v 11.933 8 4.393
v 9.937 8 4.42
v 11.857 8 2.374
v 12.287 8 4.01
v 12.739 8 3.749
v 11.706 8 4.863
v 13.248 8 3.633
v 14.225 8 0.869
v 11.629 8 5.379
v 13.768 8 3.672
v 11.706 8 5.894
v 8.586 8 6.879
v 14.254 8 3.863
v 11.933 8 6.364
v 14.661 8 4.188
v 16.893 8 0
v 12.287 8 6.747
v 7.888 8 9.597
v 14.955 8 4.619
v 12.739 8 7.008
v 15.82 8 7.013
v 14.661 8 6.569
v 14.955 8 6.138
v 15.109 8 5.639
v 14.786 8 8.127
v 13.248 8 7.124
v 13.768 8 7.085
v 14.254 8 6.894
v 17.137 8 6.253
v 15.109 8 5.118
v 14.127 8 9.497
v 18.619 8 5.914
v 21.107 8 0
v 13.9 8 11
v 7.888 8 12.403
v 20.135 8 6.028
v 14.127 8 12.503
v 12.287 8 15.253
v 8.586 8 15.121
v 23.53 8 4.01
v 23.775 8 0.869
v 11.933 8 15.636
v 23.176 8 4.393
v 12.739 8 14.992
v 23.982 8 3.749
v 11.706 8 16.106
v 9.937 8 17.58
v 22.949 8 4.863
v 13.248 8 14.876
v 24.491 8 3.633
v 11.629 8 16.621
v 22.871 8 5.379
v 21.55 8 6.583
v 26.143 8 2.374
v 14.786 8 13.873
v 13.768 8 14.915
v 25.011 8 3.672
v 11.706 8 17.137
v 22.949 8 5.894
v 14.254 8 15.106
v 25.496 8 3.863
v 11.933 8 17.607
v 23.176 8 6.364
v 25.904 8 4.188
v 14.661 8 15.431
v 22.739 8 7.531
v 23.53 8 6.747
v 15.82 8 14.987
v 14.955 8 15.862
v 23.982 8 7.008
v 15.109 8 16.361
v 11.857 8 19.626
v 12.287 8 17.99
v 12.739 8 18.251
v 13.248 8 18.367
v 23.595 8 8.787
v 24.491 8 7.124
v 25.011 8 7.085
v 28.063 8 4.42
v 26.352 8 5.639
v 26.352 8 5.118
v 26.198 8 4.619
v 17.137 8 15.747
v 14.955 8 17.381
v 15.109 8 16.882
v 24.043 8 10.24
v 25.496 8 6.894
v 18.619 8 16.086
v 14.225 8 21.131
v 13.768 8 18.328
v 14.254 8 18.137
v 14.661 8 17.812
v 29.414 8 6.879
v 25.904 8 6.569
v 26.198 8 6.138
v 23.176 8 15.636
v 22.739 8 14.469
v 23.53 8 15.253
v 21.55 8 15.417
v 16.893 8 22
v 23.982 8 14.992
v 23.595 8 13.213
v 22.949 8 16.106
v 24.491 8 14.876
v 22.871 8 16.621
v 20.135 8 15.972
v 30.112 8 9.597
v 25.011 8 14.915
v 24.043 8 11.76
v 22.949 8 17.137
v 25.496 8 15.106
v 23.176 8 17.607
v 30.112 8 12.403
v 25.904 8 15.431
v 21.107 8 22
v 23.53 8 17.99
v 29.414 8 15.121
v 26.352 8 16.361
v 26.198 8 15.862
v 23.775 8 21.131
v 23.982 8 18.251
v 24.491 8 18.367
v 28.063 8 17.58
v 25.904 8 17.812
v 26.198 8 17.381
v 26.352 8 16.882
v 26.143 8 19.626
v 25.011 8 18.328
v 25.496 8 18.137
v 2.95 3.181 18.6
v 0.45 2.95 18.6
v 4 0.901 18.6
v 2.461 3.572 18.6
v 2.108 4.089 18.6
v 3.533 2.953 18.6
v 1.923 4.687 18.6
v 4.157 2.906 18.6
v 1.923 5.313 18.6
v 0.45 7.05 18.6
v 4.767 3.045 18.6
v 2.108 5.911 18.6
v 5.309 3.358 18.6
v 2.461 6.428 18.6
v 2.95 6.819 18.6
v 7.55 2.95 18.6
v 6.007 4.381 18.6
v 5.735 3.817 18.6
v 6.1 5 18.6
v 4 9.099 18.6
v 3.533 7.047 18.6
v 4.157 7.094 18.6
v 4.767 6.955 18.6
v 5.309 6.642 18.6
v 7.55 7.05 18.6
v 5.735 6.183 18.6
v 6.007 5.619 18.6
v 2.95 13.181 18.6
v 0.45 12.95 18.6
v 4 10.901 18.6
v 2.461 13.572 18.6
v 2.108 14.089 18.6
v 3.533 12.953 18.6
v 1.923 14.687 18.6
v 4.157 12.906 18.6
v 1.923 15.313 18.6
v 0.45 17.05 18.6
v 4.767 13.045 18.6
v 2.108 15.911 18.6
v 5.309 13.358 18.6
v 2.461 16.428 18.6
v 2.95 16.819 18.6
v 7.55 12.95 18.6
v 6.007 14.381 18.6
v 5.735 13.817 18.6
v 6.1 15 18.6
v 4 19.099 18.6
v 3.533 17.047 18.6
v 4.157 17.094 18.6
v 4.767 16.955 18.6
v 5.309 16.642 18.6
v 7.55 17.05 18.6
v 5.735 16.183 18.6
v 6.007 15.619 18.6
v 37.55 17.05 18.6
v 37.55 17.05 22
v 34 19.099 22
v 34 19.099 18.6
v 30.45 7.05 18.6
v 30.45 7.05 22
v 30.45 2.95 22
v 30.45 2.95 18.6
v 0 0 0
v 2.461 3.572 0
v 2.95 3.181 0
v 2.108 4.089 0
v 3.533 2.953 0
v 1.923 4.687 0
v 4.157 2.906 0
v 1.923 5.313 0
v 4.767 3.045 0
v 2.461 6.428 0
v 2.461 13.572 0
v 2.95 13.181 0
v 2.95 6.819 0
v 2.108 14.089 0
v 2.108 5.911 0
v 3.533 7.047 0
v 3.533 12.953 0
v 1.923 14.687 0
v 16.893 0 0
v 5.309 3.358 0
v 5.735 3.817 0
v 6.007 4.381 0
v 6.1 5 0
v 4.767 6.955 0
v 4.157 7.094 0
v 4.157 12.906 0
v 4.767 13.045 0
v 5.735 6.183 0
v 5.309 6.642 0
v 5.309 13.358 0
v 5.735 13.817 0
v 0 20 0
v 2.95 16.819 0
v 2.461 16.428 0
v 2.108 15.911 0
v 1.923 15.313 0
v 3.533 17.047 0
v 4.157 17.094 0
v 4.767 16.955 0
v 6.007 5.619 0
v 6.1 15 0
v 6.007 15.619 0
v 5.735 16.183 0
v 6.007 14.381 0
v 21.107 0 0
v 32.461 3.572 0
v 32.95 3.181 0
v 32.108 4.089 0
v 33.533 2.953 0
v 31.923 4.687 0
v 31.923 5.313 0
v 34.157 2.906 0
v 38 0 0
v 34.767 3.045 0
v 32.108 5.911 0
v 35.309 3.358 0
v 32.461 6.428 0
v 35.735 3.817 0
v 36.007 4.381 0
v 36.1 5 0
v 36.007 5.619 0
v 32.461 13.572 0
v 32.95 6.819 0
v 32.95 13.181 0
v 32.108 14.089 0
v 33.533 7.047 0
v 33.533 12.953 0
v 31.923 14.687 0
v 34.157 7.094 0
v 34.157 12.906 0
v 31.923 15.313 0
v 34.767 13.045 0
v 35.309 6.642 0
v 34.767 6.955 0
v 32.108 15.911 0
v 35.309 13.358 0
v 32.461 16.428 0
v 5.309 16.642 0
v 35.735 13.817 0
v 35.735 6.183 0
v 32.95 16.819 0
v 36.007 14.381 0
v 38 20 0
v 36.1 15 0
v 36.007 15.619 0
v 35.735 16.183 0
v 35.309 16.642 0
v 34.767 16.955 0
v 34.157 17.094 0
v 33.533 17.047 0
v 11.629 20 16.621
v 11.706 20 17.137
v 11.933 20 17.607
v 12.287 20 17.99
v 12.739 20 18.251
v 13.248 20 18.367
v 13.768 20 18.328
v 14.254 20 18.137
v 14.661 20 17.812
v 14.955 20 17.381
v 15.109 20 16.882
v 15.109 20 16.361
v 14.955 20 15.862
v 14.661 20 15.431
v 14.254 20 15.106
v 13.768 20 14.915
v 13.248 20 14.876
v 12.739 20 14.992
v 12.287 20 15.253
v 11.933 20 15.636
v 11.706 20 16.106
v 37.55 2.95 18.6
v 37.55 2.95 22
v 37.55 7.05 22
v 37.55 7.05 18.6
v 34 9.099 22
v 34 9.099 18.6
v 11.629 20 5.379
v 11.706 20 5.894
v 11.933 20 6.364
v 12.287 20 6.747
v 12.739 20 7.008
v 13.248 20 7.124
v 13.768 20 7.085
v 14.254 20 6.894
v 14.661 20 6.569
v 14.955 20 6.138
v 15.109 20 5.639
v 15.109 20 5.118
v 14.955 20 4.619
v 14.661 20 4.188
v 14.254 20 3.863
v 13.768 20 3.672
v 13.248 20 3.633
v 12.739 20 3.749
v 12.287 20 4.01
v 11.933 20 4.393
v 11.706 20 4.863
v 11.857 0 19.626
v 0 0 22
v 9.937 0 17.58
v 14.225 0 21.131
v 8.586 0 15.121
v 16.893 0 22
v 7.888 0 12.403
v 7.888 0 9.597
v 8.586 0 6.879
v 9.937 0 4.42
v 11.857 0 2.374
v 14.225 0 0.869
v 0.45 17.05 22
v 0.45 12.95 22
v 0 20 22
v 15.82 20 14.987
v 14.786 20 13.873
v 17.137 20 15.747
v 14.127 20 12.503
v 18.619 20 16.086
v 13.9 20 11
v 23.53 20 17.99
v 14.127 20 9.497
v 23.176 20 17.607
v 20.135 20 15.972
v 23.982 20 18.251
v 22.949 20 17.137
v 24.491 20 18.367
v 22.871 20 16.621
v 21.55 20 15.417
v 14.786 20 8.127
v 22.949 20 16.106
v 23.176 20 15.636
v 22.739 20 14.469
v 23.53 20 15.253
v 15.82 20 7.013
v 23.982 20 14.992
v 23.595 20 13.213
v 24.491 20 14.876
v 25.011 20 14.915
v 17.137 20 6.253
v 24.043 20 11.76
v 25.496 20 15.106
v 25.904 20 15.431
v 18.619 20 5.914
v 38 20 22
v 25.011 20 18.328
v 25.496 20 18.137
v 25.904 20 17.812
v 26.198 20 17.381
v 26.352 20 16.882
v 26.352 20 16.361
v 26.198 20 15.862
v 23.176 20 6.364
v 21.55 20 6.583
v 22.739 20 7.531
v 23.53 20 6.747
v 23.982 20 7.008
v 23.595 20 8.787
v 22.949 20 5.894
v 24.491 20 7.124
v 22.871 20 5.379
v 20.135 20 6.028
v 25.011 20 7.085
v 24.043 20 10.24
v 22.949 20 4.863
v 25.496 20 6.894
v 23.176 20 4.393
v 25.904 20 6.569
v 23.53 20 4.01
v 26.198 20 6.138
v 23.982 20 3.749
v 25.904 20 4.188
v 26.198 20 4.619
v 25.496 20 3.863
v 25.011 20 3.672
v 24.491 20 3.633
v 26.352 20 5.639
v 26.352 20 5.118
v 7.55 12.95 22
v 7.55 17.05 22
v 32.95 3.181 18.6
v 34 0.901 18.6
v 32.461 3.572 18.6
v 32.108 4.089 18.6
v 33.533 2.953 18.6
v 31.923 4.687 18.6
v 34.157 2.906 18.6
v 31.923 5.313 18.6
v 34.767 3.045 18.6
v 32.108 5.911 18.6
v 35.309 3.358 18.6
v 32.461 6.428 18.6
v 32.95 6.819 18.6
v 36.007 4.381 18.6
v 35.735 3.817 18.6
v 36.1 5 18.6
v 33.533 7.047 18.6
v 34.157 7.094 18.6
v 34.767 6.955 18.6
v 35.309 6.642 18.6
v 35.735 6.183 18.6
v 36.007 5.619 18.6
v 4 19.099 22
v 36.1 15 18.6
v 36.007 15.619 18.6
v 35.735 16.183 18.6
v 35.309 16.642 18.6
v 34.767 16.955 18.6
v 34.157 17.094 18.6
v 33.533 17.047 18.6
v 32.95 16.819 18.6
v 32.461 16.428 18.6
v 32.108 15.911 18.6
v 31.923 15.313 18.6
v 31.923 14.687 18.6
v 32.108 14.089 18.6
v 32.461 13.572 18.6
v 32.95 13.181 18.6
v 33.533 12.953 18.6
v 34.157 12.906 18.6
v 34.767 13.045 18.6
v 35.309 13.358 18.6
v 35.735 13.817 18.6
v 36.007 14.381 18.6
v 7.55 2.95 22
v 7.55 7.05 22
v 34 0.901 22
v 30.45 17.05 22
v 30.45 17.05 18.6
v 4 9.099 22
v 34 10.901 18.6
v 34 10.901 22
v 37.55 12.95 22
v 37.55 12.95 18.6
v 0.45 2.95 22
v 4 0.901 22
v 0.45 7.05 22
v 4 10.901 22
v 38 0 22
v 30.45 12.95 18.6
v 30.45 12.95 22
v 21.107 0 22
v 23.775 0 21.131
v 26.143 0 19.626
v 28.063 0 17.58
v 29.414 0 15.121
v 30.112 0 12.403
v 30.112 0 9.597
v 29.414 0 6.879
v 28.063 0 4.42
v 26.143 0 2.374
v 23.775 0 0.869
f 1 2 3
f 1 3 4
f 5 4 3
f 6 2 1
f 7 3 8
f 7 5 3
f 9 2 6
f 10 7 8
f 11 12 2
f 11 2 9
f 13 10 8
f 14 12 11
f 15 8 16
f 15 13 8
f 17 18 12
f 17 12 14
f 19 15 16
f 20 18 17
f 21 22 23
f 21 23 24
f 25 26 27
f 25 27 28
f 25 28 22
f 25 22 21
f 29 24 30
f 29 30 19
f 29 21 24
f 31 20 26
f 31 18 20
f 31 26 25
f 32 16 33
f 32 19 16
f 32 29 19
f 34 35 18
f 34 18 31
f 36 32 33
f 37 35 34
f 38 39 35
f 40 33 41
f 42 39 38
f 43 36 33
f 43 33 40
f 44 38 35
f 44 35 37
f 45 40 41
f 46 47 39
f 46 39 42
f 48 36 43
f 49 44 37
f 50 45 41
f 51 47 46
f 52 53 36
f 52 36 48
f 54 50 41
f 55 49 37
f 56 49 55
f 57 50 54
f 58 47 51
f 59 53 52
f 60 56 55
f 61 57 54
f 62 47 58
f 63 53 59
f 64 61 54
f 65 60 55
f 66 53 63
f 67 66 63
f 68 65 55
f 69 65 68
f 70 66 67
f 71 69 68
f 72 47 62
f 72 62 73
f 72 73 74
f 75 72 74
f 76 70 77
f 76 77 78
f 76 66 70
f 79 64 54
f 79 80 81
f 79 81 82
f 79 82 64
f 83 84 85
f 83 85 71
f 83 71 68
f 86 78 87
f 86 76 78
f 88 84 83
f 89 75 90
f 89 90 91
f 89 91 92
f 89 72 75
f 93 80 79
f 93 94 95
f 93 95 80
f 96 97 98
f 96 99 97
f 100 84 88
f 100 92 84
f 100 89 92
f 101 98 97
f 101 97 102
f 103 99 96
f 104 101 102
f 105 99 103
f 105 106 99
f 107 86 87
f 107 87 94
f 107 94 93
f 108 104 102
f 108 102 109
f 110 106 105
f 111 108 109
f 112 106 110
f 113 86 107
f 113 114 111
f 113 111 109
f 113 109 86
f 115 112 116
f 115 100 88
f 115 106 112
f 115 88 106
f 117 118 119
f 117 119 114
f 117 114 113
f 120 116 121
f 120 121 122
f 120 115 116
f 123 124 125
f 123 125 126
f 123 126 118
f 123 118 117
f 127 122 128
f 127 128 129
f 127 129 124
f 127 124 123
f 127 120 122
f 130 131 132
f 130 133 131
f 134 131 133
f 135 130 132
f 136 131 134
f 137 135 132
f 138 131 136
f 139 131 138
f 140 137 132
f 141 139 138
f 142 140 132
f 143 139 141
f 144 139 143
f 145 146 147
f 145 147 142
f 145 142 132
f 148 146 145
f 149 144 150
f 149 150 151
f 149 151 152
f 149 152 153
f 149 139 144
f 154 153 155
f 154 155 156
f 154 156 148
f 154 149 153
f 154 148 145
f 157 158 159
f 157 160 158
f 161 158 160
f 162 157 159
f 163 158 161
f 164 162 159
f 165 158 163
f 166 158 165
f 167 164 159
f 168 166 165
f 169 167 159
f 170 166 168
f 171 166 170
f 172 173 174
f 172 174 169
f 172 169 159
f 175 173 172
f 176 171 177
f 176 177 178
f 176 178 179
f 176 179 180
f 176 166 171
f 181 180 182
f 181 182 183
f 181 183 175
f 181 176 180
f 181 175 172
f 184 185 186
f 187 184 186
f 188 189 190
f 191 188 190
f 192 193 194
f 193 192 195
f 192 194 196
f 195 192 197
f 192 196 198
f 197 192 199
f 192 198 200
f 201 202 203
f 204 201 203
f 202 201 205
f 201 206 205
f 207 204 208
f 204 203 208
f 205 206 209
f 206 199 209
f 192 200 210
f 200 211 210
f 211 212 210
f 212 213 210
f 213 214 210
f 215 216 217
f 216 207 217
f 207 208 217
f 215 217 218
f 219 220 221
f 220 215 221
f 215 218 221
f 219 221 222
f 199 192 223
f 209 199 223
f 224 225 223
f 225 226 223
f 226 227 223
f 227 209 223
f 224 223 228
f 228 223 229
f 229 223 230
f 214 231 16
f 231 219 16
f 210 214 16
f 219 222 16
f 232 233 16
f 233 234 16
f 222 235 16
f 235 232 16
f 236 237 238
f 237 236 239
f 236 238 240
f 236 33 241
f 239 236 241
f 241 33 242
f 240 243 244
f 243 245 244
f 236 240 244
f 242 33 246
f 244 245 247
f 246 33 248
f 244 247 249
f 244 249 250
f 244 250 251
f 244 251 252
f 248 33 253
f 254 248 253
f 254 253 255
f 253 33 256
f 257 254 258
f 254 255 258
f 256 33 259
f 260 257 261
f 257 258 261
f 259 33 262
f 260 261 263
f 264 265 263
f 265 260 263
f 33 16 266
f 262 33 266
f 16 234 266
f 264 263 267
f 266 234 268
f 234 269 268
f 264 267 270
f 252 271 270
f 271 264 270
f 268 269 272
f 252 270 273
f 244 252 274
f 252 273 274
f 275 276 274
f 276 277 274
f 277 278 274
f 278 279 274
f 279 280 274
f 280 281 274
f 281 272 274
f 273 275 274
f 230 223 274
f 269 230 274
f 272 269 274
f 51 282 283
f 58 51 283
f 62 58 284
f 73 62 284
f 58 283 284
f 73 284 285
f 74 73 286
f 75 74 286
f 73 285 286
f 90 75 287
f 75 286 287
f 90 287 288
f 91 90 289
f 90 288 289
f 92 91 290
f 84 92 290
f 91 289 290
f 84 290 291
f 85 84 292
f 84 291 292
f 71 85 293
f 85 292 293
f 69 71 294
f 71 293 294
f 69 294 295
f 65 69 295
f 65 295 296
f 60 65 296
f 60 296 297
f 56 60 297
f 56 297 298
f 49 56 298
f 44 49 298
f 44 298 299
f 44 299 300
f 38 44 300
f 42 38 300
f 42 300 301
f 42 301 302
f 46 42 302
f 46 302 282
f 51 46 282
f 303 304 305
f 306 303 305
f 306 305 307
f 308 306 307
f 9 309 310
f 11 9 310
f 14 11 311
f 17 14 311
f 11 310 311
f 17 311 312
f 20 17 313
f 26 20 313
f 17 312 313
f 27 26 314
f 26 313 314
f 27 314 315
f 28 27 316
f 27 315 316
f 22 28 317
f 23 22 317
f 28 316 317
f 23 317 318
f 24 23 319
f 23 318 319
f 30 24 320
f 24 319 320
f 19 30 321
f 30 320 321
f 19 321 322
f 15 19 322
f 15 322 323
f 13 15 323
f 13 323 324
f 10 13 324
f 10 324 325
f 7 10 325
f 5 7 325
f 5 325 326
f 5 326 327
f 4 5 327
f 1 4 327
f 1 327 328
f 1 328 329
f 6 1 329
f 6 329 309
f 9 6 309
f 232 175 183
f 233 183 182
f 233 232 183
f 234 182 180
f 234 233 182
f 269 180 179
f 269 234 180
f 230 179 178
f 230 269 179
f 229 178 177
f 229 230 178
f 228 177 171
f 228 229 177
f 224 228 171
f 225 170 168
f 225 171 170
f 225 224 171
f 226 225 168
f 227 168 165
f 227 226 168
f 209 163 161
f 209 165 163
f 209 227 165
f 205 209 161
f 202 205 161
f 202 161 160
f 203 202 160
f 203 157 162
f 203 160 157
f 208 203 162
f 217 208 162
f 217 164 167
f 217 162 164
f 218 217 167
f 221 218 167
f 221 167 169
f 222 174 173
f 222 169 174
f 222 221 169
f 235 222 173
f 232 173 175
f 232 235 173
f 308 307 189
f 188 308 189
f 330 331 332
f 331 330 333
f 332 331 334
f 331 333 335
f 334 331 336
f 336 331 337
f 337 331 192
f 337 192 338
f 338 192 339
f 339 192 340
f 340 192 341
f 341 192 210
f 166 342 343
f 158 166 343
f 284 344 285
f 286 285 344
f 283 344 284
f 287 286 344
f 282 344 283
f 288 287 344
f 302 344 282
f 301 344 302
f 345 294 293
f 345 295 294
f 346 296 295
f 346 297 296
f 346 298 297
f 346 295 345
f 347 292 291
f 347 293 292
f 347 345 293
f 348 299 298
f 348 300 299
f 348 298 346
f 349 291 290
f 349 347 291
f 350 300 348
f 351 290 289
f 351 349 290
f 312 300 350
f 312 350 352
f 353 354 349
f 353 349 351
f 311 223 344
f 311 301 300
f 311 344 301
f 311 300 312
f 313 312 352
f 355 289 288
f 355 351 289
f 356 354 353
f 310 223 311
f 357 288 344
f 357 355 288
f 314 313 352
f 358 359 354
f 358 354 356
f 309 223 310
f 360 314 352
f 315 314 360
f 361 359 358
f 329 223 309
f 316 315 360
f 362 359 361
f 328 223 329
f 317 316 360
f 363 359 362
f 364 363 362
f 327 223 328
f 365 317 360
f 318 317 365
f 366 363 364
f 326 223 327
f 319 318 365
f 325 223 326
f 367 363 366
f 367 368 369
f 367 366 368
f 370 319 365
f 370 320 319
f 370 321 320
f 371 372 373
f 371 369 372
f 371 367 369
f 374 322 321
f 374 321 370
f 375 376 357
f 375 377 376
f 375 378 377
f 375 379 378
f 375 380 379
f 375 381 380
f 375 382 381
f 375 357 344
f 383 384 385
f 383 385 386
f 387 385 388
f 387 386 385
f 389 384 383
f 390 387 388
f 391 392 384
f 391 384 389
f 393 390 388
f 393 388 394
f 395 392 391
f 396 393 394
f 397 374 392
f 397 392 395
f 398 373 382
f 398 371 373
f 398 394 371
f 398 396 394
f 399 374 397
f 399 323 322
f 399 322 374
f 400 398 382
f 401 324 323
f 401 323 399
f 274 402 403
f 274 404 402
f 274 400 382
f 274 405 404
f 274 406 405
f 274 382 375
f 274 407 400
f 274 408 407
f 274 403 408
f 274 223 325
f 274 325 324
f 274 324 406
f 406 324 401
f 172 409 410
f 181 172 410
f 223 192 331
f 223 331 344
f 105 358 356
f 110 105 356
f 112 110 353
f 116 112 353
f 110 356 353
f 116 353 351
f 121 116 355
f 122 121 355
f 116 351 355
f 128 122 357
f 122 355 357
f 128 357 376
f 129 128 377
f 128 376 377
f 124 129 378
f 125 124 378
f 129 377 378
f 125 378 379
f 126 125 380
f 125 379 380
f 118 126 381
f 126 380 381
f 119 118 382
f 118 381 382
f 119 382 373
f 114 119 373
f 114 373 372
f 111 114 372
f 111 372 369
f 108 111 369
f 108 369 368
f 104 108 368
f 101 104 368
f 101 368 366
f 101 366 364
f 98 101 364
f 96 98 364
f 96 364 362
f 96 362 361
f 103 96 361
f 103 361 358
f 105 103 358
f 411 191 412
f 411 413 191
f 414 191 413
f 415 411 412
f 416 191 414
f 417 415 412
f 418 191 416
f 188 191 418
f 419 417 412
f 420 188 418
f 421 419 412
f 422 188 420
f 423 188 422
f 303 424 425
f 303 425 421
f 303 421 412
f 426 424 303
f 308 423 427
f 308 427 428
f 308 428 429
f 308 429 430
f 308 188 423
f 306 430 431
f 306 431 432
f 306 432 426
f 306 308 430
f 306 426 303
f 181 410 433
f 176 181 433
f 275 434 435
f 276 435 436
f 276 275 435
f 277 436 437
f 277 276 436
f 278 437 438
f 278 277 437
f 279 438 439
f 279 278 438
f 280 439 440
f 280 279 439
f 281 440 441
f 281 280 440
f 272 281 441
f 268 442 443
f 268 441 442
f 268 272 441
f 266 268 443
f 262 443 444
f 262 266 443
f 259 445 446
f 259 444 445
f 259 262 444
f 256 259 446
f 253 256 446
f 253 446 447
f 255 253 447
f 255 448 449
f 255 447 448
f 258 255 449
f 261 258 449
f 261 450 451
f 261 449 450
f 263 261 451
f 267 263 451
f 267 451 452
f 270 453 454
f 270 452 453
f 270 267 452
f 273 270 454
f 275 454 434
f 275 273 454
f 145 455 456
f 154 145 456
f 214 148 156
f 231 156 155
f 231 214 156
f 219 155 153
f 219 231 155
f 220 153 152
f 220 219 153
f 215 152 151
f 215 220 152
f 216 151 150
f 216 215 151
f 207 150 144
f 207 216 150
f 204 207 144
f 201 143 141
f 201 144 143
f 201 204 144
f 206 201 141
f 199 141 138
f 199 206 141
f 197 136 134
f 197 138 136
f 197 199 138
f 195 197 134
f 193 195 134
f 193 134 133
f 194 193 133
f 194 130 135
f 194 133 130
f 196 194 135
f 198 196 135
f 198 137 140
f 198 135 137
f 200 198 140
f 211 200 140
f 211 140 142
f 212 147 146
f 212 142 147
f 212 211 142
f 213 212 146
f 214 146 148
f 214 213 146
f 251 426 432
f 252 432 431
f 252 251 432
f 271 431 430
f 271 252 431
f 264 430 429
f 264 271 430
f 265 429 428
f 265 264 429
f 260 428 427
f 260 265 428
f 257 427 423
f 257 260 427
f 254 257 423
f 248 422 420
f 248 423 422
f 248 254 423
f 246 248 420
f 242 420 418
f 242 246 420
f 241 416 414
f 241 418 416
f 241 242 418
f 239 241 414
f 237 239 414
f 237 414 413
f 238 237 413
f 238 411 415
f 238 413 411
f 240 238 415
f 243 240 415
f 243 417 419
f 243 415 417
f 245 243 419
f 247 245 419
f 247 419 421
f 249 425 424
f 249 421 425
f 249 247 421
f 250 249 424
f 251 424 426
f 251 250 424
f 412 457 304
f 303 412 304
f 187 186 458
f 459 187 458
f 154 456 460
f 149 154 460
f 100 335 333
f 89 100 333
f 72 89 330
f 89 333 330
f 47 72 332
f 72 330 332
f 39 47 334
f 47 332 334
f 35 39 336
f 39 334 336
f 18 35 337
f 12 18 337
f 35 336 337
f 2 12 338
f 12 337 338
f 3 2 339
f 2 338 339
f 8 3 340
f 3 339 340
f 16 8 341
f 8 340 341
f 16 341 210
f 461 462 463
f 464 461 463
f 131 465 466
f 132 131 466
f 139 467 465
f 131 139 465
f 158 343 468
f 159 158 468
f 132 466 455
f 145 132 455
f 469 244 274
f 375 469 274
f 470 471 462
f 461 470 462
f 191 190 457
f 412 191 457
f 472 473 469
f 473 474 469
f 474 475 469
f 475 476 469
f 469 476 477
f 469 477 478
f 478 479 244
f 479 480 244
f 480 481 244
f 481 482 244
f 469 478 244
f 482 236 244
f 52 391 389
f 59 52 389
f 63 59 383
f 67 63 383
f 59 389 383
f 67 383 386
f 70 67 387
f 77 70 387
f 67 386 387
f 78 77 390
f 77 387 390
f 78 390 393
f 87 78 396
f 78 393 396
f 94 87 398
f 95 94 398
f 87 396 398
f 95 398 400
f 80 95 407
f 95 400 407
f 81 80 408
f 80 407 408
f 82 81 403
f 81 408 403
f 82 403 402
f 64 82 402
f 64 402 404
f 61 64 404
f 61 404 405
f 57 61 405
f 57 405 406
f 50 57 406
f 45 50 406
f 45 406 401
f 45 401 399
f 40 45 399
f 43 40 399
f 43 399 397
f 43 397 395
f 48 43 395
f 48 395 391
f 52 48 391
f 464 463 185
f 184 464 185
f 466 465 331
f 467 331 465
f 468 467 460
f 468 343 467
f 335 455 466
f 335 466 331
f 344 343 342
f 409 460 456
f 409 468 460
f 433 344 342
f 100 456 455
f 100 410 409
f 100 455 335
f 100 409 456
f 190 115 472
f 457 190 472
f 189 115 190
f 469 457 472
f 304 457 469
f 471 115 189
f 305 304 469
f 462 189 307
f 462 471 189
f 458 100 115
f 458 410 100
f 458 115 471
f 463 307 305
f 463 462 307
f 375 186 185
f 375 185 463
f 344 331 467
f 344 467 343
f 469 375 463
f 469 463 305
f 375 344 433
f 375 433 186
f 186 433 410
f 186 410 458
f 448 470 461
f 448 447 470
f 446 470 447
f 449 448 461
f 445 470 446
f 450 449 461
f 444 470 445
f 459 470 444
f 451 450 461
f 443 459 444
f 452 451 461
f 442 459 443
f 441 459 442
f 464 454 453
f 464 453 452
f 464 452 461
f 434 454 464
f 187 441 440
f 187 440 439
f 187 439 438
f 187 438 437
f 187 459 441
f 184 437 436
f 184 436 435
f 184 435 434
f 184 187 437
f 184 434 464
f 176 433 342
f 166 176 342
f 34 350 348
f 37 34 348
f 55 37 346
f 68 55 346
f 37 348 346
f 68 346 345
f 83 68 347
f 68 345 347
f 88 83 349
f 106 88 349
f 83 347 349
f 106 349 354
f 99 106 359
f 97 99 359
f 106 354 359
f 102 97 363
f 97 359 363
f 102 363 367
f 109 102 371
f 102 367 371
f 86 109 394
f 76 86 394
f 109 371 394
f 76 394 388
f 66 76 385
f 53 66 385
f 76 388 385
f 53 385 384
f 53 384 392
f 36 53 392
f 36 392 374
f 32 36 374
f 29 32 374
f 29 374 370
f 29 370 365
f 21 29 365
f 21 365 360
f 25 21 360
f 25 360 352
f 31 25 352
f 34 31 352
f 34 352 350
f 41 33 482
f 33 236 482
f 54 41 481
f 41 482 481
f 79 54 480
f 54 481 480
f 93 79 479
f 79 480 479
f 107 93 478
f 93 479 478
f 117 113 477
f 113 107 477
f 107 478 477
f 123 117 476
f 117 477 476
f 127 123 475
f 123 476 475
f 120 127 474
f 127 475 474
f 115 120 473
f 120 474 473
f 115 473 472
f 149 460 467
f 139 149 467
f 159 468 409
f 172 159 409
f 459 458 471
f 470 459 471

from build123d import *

# Parameters (mm, degrees)
SKETCH_W        = 38
SKETCH_H        = 20
SKETCH_R        = 2.1
PAD_DEPTH       = 22
SKETCH001_R     = 11.2
POCKET_DEPTH    = 8
SKETCH002_R     = 5.1
SKETCH002_R_2   = 1.75
POCKET001_DEPTH = 20
POCKET002_DEPTH = 3.4


with BuildPart() as part:
    # Sketch → Pad (new body)
    with BuildSketch(Plane.XY):
        with Locations((19, 10)):
            Rectangle(SKETCH_W, SKETCH_H)
        with Locations((4, 15)):
            Circle(SKETCH_R, mode=Mode.SUBTRACT)
        with Locations((4, 5)):
            Circle(SKETCH_R, mode=Mode.SUBTRACT)
        with Locations((34, 15)):
            Circle(SKETCH_R, mode=Mode.SUBTRACT)
        with Locations((34, 5)):
            Circle(SKETCH_R, mode=Mode.SUBTRACT)
    extrude(amount=PAD_DEPTH)

    # Sketch001 (on Face3 of Pad) → Pocket (cut)
    with BuildSketch(Plane.XZ):
        with Locations((19, 11)):
            Circle(SKETCH001_R)
    extrude(amount=-POCKET_DEPTH, mode=Mode.SUBTRACT)

    # Sketch002 (on Face1 of Pocket) → Pocket001 (cut)
    with BuildSketch(Plane(origin=(0, 20, 0), x_dir=(-1, 0, 0), z_dir=(0, 1, 0))):
        with Locations((-19, 11)):
            Circle(SKETCH002_R)
        with Locations((-13.378501, 16.621499)):
            Circle(SKETCH002_R_2)
        with Locations((-24.621499, 5.378501)):
            Circle(SKETCH002_R_2)
        with Locations((-24.621499, 16.621499)):
            Circle(SKETCH002_R_2)
        with Locations((-13.378501, 5.378501)):
            Circle(SKETCH002_R_2)
    extrude(amount=-POCKET001_DEPTH, mode=Mode.SUBTRACT)

    # Sketch003 (on Face4 of Pocket001) → Pocket002 (cut)
    with BuildSketch(Plane.XY.offset(22)):
        Polygon((4, 10.900813), (7.55, 12.950407), (7.55, 17.049593), (4, 19.099187), (0.45, 17.049593), (0.45, 12.950407), align=None)
        Polygon((34, 10.900813), (37.55, 12.950407), (37.55, 17.049593), (34, 19.099187), (30.45, 17.049593), (30.45, 12.950407), align=None)
        Polygon((34, 9.099187), (30.45, 7.049593), (30.45, 2.950407), (34, 0.900813), (37.55, 2.950407), (37.55, 7.049593), align=None)
        Polygon((4, 9.099187), (0.45, 7.049593), (0.45, 2.950407), (4, 0.900813), (7.55, 2.950407), (7.55, 7.049593), align=None)
    extrude(amount=-POCKET002_DEPTH, mode=Mode.SUBTRACT)


solid = part.part
